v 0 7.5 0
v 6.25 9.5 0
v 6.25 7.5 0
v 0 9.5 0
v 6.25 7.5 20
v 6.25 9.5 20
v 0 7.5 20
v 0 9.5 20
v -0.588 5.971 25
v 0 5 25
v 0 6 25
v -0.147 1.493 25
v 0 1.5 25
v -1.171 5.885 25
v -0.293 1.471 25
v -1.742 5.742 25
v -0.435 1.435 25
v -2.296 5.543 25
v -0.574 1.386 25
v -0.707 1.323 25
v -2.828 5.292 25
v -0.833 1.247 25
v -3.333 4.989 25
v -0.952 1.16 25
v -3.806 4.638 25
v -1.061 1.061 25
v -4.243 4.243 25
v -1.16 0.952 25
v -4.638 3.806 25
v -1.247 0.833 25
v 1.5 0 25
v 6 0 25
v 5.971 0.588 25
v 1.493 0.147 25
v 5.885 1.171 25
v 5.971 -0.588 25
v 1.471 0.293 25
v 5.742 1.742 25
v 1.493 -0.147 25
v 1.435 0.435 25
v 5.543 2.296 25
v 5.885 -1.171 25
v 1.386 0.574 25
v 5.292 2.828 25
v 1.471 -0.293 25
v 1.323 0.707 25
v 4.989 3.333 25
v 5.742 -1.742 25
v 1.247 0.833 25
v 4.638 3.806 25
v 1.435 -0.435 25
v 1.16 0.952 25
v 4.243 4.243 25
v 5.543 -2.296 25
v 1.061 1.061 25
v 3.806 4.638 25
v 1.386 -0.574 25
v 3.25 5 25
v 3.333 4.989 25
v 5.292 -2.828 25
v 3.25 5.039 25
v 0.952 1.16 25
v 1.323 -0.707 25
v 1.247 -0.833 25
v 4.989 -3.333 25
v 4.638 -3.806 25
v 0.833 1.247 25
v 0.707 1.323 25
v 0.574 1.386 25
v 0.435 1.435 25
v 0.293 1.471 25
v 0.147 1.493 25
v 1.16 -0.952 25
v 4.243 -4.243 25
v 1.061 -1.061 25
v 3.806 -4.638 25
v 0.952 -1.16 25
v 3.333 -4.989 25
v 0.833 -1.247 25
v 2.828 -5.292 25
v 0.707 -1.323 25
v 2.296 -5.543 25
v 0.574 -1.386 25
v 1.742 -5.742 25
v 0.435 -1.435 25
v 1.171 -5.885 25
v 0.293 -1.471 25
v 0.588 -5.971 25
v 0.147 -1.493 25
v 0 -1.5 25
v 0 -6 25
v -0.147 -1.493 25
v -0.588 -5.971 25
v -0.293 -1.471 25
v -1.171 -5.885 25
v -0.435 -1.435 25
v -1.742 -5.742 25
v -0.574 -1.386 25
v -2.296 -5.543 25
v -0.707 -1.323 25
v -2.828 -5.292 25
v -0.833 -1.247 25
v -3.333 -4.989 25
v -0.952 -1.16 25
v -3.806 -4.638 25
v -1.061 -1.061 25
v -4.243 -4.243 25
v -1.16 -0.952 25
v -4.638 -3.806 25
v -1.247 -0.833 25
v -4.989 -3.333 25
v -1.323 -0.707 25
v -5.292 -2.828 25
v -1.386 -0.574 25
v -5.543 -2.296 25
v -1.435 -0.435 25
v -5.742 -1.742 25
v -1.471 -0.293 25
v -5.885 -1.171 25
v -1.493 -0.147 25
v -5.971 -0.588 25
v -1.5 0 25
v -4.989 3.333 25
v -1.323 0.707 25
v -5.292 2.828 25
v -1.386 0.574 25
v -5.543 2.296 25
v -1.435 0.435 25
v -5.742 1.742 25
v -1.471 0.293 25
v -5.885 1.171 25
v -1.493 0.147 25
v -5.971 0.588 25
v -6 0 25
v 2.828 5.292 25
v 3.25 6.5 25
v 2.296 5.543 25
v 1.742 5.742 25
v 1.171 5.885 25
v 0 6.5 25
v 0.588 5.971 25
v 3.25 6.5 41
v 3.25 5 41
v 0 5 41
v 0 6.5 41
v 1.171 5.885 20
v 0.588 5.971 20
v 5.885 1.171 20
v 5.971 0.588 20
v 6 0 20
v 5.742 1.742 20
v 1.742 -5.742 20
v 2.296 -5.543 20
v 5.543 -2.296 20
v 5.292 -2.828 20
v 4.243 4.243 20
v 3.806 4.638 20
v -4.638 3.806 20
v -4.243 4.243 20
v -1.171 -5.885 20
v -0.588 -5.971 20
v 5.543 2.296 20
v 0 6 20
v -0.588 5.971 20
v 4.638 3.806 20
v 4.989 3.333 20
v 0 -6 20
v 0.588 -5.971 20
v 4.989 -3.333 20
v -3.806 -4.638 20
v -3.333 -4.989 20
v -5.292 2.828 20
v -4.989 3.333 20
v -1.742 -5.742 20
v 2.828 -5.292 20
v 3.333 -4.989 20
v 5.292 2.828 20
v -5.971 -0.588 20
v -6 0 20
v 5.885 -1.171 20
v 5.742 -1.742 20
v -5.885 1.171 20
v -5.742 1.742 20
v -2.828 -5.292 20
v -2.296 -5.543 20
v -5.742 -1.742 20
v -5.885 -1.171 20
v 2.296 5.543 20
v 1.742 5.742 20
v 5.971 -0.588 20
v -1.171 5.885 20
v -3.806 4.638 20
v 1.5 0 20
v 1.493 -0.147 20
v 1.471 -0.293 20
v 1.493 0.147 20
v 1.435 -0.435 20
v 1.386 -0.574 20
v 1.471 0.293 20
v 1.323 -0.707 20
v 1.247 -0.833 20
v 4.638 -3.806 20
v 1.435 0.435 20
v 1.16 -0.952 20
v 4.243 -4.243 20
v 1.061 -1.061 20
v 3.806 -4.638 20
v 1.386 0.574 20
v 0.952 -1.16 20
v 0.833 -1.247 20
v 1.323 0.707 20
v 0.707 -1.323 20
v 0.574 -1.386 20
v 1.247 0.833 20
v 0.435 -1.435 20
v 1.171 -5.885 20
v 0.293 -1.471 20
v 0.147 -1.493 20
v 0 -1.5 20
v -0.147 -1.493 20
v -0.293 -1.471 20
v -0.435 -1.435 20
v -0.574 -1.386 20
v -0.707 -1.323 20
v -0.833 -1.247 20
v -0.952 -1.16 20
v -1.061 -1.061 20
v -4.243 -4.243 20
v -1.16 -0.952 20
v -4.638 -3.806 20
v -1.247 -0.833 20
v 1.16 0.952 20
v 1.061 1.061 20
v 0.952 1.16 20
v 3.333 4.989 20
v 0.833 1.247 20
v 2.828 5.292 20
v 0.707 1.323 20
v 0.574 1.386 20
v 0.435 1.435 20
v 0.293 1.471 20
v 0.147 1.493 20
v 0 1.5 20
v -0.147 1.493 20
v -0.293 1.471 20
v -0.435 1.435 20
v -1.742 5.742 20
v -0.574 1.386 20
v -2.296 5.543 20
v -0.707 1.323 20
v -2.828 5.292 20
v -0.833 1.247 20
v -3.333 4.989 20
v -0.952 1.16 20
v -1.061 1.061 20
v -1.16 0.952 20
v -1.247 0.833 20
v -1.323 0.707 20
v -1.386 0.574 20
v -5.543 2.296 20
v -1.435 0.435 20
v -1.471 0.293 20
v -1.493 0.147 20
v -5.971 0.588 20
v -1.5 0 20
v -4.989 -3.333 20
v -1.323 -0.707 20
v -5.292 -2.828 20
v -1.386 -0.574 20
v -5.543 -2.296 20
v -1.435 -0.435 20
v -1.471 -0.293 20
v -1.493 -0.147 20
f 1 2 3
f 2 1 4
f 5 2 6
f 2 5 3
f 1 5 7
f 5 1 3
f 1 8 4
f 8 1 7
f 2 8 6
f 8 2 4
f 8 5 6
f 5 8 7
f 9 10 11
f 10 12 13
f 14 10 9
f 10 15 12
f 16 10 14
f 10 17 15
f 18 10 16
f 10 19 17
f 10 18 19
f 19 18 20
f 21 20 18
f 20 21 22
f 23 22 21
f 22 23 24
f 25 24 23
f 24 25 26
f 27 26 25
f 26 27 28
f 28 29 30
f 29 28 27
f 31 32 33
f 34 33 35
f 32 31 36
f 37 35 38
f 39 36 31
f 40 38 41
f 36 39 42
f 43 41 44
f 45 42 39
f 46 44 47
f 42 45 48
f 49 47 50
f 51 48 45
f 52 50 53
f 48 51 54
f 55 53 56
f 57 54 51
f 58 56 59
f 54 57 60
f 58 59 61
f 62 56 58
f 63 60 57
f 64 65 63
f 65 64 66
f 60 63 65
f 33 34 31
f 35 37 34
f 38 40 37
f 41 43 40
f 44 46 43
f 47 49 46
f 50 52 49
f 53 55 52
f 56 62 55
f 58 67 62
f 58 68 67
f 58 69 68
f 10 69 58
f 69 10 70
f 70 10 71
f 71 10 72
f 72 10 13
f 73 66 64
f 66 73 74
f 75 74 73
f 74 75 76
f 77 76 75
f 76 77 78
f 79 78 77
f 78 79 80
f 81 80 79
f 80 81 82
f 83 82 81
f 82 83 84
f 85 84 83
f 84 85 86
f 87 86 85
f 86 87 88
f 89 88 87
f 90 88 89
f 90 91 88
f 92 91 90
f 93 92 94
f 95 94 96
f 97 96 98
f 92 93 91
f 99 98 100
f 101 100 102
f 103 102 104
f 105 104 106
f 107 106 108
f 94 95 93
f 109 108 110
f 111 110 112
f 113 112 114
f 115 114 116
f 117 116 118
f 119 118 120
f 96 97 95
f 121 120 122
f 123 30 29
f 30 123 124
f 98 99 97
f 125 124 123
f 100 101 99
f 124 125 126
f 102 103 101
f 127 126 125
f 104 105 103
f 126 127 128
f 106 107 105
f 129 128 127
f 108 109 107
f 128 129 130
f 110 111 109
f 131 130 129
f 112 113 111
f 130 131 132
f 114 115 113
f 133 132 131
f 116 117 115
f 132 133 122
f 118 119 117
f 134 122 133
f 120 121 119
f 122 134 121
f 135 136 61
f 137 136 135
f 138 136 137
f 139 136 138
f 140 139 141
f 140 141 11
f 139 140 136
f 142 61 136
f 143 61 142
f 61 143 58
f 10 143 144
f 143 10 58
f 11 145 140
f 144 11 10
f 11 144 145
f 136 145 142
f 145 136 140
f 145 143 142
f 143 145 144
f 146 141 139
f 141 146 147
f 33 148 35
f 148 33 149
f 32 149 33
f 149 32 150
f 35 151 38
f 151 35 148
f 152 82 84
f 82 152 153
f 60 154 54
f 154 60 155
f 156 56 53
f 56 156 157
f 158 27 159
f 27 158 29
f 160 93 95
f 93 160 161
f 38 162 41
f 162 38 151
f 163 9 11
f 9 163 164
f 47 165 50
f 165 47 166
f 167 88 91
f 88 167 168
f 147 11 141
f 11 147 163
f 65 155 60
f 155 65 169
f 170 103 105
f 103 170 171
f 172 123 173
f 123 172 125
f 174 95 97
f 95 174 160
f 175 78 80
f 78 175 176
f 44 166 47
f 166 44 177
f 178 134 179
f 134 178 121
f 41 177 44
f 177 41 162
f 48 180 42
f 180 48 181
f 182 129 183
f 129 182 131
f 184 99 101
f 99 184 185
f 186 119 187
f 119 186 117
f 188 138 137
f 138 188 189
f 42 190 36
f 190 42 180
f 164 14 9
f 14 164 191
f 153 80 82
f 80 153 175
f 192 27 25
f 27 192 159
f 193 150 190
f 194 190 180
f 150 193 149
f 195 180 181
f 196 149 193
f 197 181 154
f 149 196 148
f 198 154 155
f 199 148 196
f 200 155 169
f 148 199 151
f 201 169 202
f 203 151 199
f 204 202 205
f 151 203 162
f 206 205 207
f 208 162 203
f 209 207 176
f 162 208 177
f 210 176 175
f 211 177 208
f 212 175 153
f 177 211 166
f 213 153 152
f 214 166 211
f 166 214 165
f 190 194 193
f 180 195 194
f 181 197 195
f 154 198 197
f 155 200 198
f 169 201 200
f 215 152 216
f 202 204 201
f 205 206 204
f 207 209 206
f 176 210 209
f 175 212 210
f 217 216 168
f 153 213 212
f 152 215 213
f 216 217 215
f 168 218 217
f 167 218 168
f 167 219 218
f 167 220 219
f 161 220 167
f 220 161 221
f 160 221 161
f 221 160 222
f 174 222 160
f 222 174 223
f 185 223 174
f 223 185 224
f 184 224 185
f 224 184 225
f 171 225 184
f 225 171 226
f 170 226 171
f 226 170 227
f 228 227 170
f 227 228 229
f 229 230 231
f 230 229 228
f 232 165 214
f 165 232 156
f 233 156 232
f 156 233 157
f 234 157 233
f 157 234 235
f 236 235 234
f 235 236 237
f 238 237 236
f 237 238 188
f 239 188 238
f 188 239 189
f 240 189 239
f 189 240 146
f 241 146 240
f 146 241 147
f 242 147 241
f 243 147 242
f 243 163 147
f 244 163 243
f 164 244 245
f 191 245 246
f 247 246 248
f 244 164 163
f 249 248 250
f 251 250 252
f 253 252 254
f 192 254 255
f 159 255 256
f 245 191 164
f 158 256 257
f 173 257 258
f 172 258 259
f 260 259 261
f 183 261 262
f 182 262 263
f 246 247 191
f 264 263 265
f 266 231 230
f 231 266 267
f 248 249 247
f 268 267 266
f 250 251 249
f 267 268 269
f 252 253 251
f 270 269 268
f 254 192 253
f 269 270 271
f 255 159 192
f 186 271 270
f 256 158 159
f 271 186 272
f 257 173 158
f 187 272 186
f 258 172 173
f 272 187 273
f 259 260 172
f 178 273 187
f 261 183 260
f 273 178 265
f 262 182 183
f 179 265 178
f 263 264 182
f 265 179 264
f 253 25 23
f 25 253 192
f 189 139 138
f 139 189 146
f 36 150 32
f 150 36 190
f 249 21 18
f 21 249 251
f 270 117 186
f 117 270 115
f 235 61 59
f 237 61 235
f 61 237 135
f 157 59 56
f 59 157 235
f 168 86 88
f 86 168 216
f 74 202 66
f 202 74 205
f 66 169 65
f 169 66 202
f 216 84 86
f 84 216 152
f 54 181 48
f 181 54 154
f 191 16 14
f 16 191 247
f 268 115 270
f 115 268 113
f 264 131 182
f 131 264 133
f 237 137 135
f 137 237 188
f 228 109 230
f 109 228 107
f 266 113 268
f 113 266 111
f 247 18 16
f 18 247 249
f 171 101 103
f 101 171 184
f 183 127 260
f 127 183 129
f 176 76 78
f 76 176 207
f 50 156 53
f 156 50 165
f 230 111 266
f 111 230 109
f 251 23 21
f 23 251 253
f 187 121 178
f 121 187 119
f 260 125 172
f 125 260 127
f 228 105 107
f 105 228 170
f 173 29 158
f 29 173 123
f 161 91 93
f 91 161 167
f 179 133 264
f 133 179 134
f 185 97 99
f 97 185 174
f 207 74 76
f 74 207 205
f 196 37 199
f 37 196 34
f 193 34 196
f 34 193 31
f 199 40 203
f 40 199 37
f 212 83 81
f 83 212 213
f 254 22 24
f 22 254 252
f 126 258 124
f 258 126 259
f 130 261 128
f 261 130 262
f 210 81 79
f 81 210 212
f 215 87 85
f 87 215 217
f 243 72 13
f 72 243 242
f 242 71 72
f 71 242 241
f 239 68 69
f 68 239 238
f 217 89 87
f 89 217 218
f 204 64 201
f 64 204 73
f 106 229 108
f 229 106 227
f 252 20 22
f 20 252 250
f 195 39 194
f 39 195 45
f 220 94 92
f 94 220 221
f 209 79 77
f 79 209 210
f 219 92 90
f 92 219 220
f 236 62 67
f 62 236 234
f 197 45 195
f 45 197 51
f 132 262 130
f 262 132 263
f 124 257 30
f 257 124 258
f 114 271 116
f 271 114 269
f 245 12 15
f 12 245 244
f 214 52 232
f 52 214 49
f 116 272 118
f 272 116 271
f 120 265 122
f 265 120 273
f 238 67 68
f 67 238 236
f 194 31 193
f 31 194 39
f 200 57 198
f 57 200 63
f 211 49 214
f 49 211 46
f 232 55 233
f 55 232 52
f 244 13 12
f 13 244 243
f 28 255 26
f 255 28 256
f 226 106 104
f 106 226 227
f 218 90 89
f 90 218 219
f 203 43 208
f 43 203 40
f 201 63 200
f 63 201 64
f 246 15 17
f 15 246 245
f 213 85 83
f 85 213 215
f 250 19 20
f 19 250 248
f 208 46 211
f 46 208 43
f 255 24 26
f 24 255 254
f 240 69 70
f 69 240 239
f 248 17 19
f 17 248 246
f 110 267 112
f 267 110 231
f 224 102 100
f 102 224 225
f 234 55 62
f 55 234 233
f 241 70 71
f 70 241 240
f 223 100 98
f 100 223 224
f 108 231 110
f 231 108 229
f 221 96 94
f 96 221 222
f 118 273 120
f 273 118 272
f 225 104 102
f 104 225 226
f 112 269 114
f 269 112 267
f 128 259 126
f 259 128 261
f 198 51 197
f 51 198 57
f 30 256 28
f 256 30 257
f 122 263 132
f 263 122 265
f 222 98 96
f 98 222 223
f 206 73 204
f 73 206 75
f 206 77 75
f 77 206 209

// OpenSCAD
// Hose-barb reducer: 8 mm tubing -> 5 mm tubing
// Print orientation: standing upright along +Z

$fn = 64;

// ---- Dimensions (mm) ----
reducer_id      = 8;    // input tubing inner diameter
output_id       = 5;    // output tubing inner diameter
bore_d          = 3;    // through-bore diameter
barb_h_8        = 10;   // height of each 8 mm barb
barb_od_8_top   = 9.5;  // outer diameter of 8 mm barb at top
barb_od_8_bot   = 7.5;  // outer diameter of 8 mm barb at bottom
barb_h_5        = 8;    // height of each 5 mm barb
barb_od_5_top   = 5.0;  // outer diameter of 5 mm barb at top
barb_od_5_bot   = 6.5;  // outer diameter of 5 mm barb at bottom
collar_d        = 12;   // collar diameter
collar_h        = 5;    // collar height (z = 20 to 25)
eps             = 0.5;  // overshoot for clean cuts

// ---- Derived ----
total_h = barb_h_8 * 2 + collar_h + barb_h_5 * 2;  // 41 mm

// ---- Model ----
difference() {
    union() {
        // 8 mm barbs: z = 0..20
        for (z0 = [0, 10])
            translate([0, 0, z0])
                linear_extrude(height = barb_h_8)
                    polygon([
                        [0, barb_od_8_bot],
                        [0, barb_od_8_top],
                        [6.25, barb_od_8_top],
                        [6.25, barb_od_8_bot]
                    ]);

        // Collar: z = 20..25
        translate([0, 0, 20])
            cylinder(d = collar_d, h = collar_h);

        // 5 mm barbs: z = 25..41
        for (z0 = [25, 33])
            translate([0, 0, z0])
                linear_extrude(height = barb_h_5)
                    polygon([
                        [0, barb_od_5_bot],
                        [0, barb_od_5_top],
                        [3.25, barb_od_5_top],
                        [3.25, barb_od_5_bot]
                    ]);
    }

    // Through-bore along Z
    translate([0, 0, -eps])
        cylinder(d = bore_d, h = total_h + 2 * eps);
}
